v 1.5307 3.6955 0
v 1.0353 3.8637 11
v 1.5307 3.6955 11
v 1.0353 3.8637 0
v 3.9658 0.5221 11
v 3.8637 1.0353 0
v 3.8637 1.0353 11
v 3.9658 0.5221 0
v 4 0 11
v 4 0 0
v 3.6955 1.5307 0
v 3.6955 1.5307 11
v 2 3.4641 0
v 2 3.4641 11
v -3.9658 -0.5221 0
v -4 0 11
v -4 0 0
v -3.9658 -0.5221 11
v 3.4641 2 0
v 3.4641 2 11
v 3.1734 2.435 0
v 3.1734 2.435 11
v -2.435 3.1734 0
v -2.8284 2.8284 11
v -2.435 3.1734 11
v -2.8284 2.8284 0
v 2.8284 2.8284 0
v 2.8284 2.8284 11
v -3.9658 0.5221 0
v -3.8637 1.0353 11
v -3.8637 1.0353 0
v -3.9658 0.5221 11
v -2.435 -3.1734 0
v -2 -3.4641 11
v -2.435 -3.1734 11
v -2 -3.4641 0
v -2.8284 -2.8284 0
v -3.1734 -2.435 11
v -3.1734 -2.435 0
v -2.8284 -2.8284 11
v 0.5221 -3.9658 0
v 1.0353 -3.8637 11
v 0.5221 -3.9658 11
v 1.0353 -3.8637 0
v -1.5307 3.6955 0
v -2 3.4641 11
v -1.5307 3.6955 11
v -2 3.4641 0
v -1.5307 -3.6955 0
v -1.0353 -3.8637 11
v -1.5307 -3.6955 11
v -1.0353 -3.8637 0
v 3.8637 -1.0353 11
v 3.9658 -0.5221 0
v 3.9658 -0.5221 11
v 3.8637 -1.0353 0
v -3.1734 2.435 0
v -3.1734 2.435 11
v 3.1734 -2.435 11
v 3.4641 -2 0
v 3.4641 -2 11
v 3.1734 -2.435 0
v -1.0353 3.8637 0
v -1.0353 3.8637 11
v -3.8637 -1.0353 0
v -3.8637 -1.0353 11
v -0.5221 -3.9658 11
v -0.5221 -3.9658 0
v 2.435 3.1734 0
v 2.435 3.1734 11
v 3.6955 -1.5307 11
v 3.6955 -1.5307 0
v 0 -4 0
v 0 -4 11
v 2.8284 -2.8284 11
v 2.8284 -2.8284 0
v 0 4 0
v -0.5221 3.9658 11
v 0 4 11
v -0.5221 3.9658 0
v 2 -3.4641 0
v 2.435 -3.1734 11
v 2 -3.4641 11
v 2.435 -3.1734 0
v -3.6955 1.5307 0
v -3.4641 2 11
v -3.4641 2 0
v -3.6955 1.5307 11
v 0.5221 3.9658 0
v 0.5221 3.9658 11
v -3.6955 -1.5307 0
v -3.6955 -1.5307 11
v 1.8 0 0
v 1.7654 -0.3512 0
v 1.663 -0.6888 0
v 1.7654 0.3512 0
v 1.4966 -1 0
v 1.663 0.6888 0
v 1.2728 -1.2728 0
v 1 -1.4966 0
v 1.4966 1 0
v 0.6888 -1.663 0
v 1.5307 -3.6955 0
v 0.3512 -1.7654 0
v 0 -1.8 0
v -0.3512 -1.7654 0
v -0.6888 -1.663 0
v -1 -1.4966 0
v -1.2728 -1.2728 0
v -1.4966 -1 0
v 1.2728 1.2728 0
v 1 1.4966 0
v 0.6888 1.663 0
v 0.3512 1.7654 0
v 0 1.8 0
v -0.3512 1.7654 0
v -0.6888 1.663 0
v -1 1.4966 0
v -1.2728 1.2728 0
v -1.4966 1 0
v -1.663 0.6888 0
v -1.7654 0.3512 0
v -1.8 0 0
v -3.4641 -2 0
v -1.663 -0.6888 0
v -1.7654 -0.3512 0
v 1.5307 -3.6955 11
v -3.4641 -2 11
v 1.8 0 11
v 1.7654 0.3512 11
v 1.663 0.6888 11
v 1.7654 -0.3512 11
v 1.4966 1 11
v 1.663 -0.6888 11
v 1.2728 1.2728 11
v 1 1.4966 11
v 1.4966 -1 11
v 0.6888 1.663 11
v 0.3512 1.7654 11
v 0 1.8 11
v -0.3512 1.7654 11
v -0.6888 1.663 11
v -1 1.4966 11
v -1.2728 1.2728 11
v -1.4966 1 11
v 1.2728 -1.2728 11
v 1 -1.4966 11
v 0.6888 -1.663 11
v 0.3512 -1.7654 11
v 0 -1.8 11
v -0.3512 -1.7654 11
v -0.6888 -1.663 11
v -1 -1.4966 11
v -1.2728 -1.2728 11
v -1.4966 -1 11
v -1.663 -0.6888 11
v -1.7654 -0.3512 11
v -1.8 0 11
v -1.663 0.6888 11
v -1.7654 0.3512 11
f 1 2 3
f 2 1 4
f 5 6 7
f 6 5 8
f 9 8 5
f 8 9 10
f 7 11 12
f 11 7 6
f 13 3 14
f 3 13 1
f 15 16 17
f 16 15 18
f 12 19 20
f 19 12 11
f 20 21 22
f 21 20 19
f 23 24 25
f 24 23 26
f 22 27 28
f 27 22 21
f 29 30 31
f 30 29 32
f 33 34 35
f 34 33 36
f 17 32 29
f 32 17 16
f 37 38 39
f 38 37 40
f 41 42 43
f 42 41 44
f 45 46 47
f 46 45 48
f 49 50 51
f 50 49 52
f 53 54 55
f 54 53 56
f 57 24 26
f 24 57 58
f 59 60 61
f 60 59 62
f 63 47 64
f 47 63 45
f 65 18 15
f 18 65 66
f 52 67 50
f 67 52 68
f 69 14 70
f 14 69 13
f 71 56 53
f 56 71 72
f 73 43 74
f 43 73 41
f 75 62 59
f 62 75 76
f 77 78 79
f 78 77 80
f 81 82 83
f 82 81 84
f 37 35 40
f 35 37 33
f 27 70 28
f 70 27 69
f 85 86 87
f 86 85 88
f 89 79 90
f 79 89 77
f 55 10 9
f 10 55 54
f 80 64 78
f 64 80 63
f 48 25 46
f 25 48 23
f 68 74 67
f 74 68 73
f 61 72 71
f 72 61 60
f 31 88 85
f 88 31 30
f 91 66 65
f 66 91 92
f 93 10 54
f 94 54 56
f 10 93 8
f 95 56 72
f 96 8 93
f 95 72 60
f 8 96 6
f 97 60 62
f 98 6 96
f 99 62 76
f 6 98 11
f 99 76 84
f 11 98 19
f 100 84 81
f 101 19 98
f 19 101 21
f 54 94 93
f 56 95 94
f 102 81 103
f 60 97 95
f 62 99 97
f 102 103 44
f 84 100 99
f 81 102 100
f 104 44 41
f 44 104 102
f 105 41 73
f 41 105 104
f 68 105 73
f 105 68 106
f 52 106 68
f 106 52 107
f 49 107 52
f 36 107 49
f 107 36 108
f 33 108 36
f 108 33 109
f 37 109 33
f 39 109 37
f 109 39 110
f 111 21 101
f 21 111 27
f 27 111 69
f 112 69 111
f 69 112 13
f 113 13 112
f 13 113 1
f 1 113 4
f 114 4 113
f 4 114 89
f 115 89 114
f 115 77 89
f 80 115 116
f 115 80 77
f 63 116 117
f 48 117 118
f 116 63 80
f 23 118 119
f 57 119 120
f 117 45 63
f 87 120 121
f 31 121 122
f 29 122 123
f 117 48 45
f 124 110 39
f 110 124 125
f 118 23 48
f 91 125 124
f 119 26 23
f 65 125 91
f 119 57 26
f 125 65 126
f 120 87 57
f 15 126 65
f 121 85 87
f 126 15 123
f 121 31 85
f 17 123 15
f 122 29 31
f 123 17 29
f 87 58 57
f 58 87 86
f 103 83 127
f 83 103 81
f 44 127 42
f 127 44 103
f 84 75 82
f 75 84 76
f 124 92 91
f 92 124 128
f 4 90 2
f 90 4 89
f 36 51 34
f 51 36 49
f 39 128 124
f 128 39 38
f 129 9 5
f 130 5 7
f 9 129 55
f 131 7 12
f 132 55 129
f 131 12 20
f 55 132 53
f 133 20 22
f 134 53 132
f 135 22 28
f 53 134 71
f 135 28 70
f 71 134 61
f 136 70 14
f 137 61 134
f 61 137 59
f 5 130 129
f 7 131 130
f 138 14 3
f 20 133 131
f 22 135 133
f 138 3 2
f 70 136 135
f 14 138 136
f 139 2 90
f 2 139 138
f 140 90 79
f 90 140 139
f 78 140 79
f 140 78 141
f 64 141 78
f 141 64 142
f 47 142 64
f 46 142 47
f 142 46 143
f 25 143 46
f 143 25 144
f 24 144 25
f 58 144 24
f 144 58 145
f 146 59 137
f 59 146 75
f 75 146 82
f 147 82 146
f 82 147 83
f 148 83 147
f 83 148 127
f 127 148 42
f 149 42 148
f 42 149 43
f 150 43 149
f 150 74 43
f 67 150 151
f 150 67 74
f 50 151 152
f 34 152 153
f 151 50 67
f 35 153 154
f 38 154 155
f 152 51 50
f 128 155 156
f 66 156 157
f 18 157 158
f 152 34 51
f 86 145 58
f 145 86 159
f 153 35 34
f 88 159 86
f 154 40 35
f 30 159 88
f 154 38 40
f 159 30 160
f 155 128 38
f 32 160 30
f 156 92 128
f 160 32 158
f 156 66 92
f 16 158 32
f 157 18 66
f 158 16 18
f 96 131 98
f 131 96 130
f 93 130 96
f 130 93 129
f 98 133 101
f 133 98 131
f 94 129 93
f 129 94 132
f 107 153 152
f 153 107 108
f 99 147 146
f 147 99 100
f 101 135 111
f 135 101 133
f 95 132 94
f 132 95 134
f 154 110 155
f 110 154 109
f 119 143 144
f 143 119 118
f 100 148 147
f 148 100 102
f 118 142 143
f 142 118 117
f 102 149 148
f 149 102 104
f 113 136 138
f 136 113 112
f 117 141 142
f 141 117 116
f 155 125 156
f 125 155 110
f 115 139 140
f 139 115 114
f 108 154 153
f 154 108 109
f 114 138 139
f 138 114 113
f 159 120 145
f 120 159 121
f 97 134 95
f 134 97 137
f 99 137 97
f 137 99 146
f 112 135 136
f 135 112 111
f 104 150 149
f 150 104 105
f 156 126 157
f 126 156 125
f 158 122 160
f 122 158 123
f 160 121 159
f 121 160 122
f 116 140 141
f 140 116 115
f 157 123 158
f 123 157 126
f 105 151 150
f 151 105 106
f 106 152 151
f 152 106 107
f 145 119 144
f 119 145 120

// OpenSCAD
include <../lib/solar-node-lib.scad>;
$fn = 40;
horn_roller();
